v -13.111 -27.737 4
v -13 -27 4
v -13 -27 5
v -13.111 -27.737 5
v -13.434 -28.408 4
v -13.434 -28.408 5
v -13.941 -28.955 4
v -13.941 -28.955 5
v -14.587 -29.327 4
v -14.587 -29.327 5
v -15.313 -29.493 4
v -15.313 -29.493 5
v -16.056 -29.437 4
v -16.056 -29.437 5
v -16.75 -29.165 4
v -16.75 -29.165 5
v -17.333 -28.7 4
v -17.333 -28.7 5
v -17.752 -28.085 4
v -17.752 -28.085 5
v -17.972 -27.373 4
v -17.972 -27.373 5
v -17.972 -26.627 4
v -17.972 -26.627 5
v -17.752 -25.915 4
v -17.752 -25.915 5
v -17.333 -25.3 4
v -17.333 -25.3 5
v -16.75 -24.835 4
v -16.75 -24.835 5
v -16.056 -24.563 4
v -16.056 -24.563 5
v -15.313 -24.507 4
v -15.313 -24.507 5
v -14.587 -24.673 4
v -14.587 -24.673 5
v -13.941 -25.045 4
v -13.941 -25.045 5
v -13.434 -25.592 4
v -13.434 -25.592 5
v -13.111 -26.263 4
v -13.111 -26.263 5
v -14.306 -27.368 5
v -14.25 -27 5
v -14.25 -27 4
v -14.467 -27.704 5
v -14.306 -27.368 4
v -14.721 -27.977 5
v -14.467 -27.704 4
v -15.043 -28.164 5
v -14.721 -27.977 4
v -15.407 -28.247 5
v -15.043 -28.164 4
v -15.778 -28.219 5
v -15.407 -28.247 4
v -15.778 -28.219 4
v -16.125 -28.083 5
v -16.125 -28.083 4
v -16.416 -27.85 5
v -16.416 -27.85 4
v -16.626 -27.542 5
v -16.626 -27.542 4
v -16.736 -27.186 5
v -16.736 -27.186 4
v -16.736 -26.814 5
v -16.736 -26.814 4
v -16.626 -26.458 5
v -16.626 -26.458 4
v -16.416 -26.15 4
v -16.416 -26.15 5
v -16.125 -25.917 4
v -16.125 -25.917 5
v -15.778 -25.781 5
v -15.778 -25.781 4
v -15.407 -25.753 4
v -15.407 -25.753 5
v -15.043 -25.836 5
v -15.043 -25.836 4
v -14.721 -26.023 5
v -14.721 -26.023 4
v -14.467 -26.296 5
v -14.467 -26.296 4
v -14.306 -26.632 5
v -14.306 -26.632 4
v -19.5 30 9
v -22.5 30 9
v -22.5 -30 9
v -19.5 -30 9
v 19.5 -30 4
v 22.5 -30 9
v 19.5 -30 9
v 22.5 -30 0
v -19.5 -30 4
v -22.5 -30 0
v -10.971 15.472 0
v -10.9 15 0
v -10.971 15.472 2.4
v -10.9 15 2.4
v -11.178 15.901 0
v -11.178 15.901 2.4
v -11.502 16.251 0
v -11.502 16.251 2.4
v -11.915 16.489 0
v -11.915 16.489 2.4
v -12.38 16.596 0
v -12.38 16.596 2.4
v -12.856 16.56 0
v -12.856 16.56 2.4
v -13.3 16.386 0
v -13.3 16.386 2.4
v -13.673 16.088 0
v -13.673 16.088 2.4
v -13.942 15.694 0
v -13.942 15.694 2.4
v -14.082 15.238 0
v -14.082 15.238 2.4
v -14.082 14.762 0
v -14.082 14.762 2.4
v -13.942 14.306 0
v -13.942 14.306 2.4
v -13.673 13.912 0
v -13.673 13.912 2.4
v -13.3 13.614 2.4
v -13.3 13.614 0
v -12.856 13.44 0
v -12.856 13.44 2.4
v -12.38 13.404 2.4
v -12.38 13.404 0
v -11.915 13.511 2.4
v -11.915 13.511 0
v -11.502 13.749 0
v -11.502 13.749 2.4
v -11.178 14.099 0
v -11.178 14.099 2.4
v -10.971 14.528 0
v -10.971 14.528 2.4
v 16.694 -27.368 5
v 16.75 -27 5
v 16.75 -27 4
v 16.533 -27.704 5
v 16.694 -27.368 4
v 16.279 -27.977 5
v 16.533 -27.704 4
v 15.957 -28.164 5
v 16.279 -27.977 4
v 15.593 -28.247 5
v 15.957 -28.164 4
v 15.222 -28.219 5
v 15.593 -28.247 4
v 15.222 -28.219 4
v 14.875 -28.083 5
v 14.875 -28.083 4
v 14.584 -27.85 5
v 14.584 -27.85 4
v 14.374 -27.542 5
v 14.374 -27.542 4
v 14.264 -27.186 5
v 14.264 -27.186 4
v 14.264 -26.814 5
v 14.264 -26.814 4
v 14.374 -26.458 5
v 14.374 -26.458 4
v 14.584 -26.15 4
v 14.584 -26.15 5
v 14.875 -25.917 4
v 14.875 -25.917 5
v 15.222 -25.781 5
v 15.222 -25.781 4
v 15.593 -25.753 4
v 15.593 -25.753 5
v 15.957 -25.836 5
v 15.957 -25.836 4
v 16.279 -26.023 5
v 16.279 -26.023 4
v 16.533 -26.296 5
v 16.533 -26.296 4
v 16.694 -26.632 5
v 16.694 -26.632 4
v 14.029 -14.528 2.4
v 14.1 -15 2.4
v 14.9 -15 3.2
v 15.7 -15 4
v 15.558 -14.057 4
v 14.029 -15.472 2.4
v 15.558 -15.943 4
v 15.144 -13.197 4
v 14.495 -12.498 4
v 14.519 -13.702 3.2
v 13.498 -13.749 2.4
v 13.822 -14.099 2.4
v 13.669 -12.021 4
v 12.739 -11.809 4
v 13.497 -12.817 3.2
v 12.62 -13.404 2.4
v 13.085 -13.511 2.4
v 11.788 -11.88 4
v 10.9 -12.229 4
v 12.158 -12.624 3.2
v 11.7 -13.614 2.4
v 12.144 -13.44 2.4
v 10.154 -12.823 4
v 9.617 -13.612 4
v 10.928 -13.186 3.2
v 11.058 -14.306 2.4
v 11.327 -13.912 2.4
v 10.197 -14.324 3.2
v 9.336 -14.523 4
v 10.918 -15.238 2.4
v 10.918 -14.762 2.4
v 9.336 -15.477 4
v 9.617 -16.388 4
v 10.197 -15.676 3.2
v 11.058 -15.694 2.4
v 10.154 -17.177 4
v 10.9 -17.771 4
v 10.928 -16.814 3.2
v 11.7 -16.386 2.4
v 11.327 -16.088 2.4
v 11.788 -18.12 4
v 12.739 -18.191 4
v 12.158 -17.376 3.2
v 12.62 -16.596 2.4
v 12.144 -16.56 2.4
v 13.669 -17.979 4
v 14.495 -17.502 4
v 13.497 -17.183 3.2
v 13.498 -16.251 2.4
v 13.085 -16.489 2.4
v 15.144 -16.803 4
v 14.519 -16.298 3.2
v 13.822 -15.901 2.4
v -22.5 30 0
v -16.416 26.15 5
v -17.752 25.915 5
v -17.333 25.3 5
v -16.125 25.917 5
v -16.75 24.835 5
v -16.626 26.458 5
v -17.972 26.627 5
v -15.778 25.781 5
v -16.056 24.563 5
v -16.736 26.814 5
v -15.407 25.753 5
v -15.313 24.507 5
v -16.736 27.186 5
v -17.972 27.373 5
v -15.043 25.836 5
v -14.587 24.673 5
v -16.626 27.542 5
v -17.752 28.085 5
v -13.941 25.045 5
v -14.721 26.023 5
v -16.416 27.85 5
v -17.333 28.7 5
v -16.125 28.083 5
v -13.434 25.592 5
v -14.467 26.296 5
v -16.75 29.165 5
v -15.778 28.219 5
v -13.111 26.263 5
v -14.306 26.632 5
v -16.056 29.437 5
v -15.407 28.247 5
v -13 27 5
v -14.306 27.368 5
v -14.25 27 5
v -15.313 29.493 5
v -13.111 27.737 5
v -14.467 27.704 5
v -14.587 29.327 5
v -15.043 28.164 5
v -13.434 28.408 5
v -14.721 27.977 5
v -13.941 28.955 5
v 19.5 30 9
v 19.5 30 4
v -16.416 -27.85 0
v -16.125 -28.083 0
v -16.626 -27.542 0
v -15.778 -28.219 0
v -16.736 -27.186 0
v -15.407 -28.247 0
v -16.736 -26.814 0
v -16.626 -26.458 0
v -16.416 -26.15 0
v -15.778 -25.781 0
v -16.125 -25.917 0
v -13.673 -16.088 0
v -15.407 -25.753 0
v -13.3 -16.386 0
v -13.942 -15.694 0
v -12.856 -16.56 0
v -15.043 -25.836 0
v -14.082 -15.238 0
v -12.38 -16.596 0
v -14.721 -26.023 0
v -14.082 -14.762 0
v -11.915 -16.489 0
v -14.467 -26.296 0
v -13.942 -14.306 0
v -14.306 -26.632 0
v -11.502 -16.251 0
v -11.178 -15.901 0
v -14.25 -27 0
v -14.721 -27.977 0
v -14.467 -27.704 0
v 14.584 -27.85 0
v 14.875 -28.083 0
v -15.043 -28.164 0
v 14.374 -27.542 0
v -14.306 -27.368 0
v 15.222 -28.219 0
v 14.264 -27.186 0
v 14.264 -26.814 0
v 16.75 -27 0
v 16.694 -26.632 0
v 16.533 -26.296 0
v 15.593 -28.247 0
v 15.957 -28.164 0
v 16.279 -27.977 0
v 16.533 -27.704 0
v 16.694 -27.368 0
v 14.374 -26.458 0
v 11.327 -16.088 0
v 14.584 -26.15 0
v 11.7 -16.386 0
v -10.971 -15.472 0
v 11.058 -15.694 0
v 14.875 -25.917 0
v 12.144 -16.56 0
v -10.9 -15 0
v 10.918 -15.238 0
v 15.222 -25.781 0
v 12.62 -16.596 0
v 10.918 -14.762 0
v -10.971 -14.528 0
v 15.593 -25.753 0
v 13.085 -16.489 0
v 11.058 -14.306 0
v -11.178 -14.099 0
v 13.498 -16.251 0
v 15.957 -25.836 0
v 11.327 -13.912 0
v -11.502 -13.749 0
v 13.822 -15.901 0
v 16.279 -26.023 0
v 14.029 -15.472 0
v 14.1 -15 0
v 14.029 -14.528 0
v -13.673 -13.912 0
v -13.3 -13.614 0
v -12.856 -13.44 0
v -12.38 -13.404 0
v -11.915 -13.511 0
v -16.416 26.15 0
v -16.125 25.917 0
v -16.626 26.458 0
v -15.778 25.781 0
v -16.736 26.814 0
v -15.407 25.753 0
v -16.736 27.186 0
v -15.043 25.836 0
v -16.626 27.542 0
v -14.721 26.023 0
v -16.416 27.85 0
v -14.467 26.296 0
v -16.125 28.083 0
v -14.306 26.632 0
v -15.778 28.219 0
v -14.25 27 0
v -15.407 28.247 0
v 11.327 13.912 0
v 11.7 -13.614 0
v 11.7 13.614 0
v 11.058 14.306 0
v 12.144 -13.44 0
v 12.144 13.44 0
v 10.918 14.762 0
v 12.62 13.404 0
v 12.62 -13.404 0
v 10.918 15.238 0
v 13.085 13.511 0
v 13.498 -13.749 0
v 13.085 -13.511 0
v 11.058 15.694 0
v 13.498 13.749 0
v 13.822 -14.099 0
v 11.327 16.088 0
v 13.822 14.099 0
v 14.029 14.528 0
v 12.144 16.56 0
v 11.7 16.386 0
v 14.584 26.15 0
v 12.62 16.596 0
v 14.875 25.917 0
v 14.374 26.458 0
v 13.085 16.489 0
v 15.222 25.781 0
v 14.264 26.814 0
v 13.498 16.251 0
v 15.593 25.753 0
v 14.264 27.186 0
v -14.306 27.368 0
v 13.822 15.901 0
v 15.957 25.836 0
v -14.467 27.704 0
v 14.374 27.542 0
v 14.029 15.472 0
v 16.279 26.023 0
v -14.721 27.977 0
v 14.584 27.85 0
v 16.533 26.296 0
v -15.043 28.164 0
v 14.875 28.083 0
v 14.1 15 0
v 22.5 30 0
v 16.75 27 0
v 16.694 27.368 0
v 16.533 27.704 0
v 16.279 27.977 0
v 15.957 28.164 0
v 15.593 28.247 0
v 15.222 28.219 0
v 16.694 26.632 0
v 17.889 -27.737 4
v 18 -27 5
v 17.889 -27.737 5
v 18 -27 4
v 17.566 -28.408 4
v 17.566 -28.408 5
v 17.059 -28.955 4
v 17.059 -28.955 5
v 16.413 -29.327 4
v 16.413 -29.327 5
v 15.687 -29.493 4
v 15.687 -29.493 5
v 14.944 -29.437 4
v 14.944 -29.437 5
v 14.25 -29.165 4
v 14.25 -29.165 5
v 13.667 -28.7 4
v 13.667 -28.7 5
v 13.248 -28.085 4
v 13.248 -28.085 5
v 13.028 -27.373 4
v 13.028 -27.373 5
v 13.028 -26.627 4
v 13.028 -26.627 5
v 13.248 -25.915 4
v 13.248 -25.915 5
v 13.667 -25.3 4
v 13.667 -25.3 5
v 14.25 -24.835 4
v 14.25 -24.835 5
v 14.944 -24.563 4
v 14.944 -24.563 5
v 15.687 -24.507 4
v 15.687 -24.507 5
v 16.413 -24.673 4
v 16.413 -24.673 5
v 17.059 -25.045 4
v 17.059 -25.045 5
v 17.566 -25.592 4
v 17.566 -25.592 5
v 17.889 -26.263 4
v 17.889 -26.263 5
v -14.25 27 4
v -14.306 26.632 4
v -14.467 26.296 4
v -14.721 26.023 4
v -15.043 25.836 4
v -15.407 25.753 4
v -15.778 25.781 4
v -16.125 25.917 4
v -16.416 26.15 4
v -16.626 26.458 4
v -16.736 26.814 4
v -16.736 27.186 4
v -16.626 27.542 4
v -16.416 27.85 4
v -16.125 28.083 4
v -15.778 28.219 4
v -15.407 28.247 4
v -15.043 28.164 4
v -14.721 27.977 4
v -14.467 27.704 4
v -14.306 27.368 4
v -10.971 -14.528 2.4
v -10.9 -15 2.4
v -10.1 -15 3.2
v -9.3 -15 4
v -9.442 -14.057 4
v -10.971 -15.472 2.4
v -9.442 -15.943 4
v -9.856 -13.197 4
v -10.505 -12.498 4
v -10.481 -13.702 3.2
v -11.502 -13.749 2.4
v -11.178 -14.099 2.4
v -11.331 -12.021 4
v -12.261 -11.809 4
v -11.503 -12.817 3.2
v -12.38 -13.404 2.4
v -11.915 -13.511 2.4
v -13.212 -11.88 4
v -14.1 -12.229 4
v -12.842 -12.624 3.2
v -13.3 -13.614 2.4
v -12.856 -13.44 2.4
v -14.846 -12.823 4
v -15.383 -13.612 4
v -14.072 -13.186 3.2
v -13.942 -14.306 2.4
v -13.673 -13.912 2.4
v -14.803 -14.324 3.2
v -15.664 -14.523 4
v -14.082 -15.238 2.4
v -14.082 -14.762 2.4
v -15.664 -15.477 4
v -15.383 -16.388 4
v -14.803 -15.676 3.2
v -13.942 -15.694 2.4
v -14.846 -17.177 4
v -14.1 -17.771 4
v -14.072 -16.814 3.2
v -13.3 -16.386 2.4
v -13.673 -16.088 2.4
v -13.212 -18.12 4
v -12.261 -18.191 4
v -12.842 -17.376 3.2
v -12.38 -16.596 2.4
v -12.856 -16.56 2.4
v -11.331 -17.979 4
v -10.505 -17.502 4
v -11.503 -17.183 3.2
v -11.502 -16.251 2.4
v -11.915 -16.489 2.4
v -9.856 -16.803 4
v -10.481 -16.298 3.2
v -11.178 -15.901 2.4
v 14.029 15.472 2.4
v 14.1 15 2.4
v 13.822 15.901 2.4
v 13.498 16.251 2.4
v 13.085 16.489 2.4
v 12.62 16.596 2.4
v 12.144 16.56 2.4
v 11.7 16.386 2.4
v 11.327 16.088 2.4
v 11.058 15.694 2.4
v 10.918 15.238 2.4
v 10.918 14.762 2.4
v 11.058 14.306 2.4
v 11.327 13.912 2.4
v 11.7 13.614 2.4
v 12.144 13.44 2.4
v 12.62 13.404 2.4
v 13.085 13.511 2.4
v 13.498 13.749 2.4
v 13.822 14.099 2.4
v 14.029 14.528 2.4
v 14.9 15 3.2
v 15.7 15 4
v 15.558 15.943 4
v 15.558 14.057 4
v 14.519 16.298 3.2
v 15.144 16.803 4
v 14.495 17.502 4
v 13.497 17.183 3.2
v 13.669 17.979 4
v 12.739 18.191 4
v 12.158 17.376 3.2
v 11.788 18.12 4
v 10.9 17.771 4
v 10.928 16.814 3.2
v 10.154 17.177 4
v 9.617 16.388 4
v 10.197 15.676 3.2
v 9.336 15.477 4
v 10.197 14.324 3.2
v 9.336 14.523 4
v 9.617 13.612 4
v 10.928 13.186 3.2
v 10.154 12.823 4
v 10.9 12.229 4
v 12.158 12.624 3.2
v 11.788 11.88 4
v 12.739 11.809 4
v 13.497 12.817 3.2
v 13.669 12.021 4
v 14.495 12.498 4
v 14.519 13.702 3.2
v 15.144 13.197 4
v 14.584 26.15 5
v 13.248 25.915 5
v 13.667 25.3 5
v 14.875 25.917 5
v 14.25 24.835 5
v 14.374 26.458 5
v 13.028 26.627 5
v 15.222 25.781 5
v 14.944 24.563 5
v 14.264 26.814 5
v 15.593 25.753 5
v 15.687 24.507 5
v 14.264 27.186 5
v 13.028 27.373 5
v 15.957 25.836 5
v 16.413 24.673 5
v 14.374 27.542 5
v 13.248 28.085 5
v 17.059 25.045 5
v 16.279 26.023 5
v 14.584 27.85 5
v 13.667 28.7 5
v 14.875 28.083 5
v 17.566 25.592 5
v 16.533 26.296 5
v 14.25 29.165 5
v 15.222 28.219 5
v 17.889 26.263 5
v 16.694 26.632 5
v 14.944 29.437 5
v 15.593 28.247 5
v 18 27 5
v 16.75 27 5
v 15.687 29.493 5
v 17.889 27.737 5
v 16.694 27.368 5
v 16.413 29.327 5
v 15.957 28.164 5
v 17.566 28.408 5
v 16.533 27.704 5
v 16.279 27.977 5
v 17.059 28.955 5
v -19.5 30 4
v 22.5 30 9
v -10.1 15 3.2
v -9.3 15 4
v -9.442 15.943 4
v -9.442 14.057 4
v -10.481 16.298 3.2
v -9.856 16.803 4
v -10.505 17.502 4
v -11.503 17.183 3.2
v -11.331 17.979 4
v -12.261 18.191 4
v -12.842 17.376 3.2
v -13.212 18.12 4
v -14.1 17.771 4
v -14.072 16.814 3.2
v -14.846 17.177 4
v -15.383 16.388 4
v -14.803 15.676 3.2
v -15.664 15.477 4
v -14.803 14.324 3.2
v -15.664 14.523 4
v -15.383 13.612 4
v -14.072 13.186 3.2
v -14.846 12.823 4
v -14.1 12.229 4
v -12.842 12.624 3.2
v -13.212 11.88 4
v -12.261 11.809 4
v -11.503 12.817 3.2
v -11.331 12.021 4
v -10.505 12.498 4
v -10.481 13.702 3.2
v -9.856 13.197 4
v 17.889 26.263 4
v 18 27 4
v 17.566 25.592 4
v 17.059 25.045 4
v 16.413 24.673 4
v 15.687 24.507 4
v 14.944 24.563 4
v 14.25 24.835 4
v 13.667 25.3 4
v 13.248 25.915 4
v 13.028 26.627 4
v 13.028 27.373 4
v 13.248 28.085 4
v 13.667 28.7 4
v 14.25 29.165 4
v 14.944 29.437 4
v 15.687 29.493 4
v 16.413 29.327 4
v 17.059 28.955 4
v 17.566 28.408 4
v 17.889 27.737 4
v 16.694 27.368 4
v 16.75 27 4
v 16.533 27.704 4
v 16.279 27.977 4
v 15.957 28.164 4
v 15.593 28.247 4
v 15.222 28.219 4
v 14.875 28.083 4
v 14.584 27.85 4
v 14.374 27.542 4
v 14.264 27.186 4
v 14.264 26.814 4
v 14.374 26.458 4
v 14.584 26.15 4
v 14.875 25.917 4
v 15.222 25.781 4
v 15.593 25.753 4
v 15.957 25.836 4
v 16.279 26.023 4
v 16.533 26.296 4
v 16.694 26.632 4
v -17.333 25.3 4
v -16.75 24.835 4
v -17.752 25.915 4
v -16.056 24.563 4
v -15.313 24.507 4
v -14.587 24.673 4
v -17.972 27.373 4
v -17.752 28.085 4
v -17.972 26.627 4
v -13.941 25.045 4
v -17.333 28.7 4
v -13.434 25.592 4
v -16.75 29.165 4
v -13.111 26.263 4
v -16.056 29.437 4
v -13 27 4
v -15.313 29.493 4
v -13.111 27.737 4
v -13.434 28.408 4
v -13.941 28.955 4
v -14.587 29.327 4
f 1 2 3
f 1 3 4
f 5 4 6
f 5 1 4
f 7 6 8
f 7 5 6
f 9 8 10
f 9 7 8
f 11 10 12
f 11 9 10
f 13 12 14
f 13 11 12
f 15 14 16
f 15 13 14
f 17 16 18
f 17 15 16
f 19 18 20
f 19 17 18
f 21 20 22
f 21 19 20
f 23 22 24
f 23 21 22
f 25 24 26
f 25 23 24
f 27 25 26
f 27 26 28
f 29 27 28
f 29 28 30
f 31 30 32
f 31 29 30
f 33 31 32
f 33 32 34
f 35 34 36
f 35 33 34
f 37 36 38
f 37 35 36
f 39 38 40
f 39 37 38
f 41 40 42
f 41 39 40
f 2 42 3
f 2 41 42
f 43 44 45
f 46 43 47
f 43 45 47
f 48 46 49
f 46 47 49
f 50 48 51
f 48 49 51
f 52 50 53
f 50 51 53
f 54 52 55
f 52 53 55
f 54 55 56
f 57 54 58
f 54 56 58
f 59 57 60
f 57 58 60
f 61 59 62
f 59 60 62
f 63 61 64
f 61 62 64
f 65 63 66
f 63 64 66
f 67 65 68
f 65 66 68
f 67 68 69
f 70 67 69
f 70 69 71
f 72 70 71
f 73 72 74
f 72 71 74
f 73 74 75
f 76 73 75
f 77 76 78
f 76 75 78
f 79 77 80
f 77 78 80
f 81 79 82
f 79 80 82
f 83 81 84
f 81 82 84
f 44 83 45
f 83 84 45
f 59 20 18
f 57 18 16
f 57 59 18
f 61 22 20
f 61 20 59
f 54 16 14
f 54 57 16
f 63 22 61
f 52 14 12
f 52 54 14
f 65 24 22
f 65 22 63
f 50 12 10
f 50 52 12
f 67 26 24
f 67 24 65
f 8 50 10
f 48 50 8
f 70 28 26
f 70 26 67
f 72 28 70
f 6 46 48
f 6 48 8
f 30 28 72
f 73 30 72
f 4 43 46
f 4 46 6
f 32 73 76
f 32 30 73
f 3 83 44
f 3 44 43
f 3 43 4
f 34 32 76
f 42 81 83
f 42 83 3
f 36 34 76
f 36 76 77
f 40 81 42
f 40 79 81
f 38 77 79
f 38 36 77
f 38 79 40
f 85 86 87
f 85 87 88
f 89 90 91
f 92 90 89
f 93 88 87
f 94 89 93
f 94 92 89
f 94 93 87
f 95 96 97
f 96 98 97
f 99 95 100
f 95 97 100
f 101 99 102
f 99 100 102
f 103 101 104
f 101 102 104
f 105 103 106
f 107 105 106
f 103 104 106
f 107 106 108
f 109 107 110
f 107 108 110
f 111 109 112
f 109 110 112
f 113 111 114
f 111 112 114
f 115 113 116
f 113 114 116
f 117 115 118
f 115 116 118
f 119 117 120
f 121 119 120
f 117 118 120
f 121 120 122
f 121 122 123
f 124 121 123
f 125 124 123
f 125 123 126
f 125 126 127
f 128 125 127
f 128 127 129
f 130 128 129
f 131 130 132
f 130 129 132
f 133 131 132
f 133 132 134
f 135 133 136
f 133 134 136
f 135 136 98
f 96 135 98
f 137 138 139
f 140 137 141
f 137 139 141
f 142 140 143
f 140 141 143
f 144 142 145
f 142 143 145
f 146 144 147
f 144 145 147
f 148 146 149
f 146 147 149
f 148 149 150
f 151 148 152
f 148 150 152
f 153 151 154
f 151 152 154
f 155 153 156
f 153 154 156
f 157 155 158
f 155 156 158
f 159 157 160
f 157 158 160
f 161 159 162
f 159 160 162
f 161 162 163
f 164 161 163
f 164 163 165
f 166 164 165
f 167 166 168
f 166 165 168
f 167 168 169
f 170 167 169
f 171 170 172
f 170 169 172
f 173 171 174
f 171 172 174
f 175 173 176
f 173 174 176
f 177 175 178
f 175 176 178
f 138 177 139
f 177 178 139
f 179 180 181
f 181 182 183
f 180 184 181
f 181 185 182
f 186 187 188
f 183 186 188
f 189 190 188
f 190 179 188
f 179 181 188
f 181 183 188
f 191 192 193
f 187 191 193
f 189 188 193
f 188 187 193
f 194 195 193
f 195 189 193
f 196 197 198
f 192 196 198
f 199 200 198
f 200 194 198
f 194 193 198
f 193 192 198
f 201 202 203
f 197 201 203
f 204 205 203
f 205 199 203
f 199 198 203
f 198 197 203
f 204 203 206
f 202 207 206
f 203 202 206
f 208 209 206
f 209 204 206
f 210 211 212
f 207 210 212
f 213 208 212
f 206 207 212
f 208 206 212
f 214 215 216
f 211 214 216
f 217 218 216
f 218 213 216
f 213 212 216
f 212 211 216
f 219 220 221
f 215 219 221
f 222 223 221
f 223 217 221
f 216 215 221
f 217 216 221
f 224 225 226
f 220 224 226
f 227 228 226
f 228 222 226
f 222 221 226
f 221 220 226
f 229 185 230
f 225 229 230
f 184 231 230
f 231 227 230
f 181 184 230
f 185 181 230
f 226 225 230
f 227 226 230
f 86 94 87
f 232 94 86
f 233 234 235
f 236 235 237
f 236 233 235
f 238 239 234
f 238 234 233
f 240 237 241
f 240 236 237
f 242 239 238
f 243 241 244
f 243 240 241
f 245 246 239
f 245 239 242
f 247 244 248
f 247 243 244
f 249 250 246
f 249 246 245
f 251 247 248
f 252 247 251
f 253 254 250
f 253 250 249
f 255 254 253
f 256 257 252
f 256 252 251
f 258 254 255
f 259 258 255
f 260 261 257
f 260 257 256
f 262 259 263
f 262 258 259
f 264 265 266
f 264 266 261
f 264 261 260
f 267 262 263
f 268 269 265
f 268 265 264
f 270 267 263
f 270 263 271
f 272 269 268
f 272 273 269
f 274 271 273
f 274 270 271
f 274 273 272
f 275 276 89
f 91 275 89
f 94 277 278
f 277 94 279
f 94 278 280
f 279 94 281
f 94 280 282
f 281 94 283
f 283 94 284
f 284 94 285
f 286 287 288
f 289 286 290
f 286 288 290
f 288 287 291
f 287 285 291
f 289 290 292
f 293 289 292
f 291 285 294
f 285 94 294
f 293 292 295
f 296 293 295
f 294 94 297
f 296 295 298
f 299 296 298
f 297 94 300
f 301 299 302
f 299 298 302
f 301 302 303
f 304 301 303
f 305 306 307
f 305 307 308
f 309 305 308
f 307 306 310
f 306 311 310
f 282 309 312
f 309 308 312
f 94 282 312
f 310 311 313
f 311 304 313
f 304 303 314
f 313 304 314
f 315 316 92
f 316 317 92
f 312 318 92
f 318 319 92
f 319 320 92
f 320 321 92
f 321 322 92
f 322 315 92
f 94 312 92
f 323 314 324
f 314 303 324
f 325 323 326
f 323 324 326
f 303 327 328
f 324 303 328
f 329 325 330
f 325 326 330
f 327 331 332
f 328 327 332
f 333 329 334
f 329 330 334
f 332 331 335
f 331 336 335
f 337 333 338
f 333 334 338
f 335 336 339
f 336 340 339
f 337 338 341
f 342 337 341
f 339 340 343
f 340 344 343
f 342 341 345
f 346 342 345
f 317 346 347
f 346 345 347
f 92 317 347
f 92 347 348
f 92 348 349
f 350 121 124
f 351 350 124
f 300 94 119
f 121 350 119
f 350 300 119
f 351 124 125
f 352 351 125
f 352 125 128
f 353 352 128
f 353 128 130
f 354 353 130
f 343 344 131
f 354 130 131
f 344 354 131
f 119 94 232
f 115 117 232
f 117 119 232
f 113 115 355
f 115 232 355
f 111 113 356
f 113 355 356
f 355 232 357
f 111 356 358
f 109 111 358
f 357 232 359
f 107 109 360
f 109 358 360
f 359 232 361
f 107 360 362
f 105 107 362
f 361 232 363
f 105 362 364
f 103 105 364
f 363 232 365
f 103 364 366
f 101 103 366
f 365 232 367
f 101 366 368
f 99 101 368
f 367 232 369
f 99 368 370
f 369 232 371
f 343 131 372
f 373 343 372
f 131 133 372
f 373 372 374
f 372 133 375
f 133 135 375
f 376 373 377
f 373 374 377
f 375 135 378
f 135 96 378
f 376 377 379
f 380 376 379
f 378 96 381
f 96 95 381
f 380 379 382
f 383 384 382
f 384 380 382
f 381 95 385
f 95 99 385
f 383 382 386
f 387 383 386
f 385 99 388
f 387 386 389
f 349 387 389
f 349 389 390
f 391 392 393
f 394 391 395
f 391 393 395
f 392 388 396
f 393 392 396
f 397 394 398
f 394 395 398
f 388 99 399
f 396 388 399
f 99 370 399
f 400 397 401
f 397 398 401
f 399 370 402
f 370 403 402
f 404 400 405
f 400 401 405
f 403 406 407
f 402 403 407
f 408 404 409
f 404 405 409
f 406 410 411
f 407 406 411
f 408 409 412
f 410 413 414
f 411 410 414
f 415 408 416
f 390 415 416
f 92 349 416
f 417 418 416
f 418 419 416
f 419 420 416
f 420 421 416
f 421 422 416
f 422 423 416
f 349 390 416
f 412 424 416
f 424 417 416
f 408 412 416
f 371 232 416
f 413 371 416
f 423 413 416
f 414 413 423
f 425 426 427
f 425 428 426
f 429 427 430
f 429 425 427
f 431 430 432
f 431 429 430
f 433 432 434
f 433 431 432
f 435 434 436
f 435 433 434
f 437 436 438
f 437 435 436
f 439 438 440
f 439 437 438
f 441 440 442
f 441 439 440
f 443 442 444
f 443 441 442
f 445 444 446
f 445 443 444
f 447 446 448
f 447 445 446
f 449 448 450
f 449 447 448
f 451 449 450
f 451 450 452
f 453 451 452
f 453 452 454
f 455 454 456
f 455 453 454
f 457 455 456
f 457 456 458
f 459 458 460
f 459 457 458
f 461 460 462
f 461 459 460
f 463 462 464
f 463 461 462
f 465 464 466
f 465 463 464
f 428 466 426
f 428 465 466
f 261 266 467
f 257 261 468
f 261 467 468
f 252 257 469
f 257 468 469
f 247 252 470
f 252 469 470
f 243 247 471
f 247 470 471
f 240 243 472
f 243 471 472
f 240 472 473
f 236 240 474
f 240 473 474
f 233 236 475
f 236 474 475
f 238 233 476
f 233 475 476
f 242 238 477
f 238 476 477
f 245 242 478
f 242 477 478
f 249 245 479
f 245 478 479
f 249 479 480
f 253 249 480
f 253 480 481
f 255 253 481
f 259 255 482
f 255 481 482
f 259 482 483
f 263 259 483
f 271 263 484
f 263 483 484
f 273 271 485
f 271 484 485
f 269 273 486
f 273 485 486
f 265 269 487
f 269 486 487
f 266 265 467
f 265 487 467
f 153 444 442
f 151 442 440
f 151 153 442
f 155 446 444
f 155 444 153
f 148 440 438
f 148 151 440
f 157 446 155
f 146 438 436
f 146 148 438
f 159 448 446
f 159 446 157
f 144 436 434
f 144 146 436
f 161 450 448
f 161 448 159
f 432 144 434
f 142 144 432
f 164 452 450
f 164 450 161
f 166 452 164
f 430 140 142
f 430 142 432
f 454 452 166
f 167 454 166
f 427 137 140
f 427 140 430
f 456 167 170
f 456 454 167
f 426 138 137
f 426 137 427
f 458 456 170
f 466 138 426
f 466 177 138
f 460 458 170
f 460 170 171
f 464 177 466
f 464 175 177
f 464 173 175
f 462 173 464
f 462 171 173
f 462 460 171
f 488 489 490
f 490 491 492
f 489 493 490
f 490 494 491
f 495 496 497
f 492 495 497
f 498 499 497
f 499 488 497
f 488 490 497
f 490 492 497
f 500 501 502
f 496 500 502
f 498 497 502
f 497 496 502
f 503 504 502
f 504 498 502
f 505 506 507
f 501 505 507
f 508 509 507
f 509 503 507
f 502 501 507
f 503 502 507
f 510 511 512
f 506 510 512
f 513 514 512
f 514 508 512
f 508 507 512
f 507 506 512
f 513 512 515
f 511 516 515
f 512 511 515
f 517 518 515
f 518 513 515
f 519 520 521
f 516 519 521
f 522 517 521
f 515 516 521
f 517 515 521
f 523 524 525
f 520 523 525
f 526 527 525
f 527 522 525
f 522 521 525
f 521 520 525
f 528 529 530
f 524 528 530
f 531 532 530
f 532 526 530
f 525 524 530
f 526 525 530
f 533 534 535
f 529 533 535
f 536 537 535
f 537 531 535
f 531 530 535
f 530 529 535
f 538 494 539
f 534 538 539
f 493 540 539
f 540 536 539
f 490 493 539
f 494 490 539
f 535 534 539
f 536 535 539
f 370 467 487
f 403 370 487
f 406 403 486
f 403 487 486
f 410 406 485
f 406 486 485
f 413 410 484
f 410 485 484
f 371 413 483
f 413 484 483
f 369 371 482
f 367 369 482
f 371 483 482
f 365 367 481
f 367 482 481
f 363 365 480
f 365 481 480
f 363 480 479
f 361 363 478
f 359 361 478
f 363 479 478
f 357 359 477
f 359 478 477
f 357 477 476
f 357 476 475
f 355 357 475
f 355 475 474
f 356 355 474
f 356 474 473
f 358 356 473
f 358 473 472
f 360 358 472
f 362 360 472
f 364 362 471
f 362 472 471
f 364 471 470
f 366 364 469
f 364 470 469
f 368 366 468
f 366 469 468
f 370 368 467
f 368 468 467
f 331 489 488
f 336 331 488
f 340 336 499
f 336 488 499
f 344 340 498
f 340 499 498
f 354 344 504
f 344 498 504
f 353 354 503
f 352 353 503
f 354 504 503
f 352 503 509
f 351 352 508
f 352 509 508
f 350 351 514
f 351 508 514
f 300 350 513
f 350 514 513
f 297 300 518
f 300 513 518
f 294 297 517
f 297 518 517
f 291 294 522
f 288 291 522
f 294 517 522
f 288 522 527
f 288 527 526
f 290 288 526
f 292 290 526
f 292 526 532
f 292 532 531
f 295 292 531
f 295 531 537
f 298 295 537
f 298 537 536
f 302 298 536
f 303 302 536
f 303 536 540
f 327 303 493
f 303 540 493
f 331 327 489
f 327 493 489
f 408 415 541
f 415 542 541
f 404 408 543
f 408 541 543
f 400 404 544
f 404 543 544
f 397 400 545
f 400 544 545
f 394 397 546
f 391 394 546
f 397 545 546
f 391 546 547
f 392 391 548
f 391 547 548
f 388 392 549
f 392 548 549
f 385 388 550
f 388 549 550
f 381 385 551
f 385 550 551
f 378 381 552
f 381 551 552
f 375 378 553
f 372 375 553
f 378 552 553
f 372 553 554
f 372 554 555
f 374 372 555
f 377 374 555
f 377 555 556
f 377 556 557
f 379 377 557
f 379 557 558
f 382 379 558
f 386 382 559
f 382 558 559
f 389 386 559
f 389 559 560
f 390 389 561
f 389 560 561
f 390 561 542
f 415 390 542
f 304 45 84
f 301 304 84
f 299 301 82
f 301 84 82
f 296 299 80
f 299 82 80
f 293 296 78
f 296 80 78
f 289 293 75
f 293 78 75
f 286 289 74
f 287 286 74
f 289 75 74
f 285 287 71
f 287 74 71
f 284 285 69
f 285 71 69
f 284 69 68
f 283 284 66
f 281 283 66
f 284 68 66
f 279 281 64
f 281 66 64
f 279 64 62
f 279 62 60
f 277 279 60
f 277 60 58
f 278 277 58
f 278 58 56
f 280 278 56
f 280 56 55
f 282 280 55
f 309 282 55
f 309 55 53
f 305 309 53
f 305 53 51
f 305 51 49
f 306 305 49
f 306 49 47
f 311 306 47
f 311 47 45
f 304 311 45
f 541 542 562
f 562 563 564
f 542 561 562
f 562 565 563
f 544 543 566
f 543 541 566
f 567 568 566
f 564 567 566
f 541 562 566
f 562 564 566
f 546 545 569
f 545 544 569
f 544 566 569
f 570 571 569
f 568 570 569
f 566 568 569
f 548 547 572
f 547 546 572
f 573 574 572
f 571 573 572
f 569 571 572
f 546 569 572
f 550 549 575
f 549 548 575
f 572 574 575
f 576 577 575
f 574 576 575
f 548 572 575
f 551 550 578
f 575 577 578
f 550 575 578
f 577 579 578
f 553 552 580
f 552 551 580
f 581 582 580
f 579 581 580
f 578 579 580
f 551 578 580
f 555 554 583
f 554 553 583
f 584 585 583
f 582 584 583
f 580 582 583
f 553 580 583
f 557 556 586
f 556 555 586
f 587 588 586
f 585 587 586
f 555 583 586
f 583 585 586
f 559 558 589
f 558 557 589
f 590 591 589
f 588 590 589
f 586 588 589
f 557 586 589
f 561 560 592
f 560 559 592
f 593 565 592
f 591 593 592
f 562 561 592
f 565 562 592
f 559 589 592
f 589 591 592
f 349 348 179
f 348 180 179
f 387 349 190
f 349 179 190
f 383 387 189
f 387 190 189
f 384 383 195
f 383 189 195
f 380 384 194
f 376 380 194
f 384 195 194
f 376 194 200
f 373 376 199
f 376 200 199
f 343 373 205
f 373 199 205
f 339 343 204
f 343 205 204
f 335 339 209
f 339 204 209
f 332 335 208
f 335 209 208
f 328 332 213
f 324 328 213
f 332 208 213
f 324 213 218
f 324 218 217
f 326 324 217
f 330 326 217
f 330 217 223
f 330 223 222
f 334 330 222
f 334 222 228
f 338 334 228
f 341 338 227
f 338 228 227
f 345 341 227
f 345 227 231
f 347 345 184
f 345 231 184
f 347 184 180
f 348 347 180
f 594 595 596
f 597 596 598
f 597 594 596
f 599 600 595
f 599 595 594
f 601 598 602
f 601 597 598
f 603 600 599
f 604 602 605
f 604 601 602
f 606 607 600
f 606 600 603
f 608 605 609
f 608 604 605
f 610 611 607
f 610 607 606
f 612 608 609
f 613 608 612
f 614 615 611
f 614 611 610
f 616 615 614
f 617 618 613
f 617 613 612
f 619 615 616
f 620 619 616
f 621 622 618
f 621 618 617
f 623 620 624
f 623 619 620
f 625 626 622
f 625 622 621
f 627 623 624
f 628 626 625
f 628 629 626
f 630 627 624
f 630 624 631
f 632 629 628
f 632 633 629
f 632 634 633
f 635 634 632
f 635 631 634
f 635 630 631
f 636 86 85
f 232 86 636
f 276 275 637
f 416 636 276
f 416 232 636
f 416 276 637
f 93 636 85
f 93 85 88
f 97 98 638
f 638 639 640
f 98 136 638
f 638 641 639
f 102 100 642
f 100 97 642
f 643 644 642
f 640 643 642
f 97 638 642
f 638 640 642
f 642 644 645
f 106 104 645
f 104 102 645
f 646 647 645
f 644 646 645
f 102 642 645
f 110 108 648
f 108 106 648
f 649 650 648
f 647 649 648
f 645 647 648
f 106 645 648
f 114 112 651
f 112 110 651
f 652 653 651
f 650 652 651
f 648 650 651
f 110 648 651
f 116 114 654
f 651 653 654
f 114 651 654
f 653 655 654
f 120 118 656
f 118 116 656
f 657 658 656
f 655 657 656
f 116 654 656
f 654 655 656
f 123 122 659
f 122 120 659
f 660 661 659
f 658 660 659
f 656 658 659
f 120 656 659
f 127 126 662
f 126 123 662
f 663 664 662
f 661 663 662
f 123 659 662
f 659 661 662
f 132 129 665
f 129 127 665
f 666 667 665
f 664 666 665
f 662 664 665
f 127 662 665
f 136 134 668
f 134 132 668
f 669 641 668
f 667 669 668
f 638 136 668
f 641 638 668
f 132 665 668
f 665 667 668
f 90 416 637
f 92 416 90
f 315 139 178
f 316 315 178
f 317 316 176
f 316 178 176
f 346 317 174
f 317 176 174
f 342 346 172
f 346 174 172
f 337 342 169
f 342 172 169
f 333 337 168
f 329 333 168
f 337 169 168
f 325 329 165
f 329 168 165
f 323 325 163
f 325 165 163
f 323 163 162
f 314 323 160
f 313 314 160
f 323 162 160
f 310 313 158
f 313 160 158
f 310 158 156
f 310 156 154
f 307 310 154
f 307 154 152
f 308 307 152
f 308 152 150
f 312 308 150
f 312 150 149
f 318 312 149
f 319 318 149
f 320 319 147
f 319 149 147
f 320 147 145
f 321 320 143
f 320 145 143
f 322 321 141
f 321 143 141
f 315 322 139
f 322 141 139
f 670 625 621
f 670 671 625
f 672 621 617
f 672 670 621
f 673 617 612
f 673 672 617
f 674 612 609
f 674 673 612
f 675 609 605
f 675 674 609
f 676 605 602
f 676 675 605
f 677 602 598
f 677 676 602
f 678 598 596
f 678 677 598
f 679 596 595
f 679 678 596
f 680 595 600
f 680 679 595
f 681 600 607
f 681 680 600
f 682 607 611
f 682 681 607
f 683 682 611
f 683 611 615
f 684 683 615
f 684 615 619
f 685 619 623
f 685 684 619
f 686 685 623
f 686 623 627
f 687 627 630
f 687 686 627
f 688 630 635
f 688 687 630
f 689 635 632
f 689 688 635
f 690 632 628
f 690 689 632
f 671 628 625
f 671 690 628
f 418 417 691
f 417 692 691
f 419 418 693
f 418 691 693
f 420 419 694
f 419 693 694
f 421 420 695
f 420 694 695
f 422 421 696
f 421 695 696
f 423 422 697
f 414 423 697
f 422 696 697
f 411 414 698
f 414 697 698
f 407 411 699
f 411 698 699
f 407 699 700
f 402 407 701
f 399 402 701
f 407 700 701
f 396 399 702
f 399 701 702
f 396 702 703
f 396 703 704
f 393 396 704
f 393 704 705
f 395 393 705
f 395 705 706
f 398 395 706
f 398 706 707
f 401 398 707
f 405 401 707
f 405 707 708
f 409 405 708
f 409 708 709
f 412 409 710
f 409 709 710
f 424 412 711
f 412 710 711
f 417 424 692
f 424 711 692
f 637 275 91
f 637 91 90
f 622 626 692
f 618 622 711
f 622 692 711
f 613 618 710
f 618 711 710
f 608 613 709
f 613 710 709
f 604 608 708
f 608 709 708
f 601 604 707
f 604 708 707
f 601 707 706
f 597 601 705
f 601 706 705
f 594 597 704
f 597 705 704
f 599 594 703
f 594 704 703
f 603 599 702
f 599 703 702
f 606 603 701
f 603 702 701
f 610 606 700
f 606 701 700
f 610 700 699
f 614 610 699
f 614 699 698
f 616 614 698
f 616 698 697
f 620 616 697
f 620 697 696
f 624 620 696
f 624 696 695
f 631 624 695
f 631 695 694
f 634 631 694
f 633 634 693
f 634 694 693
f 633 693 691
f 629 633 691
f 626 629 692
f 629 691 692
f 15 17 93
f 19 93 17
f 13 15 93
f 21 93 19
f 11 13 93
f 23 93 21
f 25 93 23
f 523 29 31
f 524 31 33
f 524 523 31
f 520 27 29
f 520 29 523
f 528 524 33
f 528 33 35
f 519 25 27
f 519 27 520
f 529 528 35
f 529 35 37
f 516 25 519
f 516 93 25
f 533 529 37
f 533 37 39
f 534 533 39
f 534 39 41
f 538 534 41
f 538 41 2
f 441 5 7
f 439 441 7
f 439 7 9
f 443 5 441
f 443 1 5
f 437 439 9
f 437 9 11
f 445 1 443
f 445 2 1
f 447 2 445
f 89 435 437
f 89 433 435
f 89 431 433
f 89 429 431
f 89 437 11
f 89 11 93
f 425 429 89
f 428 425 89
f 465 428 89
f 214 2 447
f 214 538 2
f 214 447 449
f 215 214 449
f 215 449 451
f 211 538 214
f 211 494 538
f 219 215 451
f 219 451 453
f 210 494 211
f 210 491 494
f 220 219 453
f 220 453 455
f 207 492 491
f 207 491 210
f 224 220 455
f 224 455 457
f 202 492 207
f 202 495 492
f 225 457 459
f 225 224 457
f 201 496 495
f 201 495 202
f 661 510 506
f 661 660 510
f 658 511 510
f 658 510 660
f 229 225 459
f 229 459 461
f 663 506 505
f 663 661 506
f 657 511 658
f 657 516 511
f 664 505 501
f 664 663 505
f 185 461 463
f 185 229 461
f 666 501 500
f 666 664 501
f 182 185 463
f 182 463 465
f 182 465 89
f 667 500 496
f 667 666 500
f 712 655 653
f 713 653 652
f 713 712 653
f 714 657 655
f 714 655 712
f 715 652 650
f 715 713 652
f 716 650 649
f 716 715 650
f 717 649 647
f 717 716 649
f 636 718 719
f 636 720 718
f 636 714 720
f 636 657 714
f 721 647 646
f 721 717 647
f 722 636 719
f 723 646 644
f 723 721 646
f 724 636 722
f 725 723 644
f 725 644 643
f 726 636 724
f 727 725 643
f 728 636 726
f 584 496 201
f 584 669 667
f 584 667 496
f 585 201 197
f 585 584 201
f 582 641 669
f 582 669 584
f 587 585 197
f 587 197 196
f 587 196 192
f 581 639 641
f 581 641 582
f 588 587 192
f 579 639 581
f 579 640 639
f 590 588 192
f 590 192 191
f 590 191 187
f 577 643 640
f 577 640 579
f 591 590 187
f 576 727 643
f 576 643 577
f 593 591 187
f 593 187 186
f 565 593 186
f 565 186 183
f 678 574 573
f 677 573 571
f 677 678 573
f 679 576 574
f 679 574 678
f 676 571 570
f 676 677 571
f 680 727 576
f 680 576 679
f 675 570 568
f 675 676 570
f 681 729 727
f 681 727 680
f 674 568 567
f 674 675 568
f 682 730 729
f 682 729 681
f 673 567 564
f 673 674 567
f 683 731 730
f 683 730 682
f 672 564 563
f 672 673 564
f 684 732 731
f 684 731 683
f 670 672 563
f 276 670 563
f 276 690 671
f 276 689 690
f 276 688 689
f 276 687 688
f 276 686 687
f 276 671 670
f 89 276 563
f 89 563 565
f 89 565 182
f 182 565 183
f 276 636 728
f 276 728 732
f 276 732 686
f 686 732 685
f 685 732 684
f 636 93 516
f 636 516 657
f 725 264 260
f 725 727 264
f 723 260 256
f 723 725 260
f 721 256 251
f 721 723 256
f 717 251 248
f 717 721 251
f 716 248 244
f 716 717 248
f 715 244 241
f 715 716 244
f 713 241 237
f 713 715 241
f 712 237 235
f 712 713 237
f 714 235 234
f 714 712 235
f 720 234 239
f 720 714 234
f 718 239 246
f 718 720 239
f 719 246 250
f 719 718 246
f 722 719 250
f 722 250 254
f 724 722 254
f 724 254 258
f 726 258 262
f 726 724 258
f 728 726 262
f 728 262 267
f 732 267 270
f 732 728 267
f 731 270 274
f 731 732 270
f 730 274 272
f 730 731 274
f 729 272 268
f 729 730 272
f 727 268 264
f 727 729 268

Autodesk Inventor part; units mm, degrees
ref_plane "YZ Plane" through (0, 0, 0) normal (1, 0, 0) x (0, 1, 0)
ref_plane "XZ Plane" through (0, 0, 0) normal (0, 1, 0) x (-1, 0, 0)
ref_plane "XY Plane" through (0, 0, 0) normal (0, 0, 1) x (1, 0, 0)
sketch "스케치1" plane through (0, 0, 0) normal (0, 0, 1) x (1, 0, 0)
  line L0 (-22.5, 30) -> (22.5, 30)
  line L1 (22.5, 30) -> (22.5, -30)
  line L2 (22.5, -30) -> (-22.5, -30)
  line L3 (-22.5, -30) -> (-22.5, 30)
  point P0 (0, 0)
  dimension "d0" = 45
  dimension "d1" = 60
  dimension "d2" = 30
  dimension "d3" = 22.5
extrude "돌출1" add sketch "스케치1" along normal blind 4
sketch "스케치2" plane through (0, 0, 4) normal (0, 0, 1) x (1, 0, 0)
  line L0 (-15.5, 27) -> (15.5, 27)
  line L1 (15.5, 27) -> (15.5, -27)
  line L2 (15.5, -27) -> (-15.5, -27)
  line L3 (-15.5, -27) -> (-15.5, 27)
  circle A0 centre (-15.5, 27) radius 1.25
  circle A1 centre (15.5, 27) radius 1.25
  circle A2 centre (-15.5, -27) radius 1.25
  circle A3 centre (15.5, -27) radius 1.25
  point P0 (0, 0)
  dimension "d6" = 31
  dimension "d7" = 54
  dimension "d8" = 15.5
  dimension "d9" = 27
  dimension "d10" = 2.5
  dimension "d11" = 2.5
  dimension "d12" = 2.5
  dimension "d13" = 2.5
extrude "돌출2" cut sketch "스케치2" against normal up to surface (4 mm away) contours L3 A0 L0 | L0 A0 L3 | A1 L1 L0 | L0 L1 A1 | A2 L2 L3 | L3 L2 A2 | A3 L2 L1 | L1 L2 A3
sketch "스케치3" plane through (0, 0, 4) normal (0, 0, 1) x (1, 0, 0)
  line L0 (-22.5, 30) -> (-22.5, -30) projected
  line L1 (-22.5, -30) -> (22.5, -30) projected
  line L2 (-22.5, 30) -> (-19.5, 30)
  line L3 (-19.5, 30) -> (-19.5, -30)
  line L4 (-19.5, -30) -> (-22.5, -30)
  line L5 (-22.5, -30) -> (-22.5, 30)
  line L6 (22.5, 30) -> (-22.5, 30) projected
  line L7 (22.5, 30) -> (19.5, 30)
  line L8 (19.5, 30) -> (19.5, -30)
  line L9 (19.5, -30) -> (22.5, -30)
  line L10 (22.5, -30) -> (22.5, 30)
  point P0 (0, 0)
  dimension "d16" = 3
  dimension "d17" = 3
extrude "돌출3" add sketch "스케치3" along normal blind 5 contours L2 L3 L1 L0 | L6 L10 L1 L8
sketch "스케치4" plane through (0, 0, 4) normal (0, 0, 1) x (1, 0, 0)
  circle A0 centre (-15.5, 27) radius 1.25 projected
  circle A1 centre (15.5, 27) radius 1.25 projected
  circle A2 centre (15.5, -27) radius 1.25 projected
  circle A3 centre (-15.5, -27) radius 1.25 projected
  circle A4 centre (-15.5, 27) radius 2.5
  circle A5 centre (-15.5, 27) radius 1.25
  circle A6 centre (15.5, 27) radius 2.5
  circle A7 centre (15.5, 27) radius 1.25
  circle A8 centre (15.5, -27) radius 2.5
  circle A9 centre (15.5, -27) radius 1.25
  circle A10 centre (-15.5, -27) radius 2.5
  circle A11 centre (-15.5, -27) radius 1.25
  point P0 (0, 0)
  dimension "d20" = 5
  dimension "d21" = 2.5
  dimension "d22" = 5
  dimension "d23" = 2.5
  dimension "d24" = 5
  dimension "d25" = 2.5
  dimension "d26" = 5
  dimension "d27" = 2.5
extrude "돌출4" add sketch "스케치4" along normal blind 1
sketch "스케치5" plane through (0, 0, 4) normal (0, 0, 1) x (1, 0, 0)
  line L0 (-12.5, 15) -> (12.5, 15)
  line L1 (12.5, 15) -> (12.5, -15)
  line L2 (12.5, -15) -> (-12.5, -15)
  line L3 (-12.5, -15) -> (-12.5, 15)
  circle A0 centre (-12.5, 15) radius 1.6
  circle A1 centre (12.5, 15) radius 1.6
  circle A2 centre (-12.5, -15) radius 1.6
  circle A3 centre (12.5, -15) radius 1.6
  point P0 (0, 0)
  dimension "d30" = 25
  dimension "d31" = 30
  dimension "d32" = 15
  dimension "d33" = 12.5
  dimension "d34" = 3.2
  dimension "d35" = 3.2
  dimension "d36" = 3.2
  dimension "d37" = 3.2
extrude "돌출5" cut sketch "스케치5" against normal up to surface (4 mm away) contours L3 A0 L0 | L0 A0 L3 | A1 L1 L0 | L0 L1 A1 | A2 L2 L3 | L3 L2 A2 | A3 L2 L1 | L1 L2 A3
chamfer "모따기1" distance 1.6 angle 45 4 edges at (10.9, -15, 4) (-14.1, -15, 4) (10.9, 15, 4) (-14.1, 15, 4)
equation "\"d2\" = 0.5 * d1"
equation "\"d3\" = 0.5 * d0"
equation "\"d8\" = 0.5 * d6"
equation "\"d9\" = 0.5 * d7"
equation "\"d32\" = 0.5 * d31"
equation "\"d33\" = 0.5 * d30"
properties part number "회로프레임" material "LCP 플라스틱"
